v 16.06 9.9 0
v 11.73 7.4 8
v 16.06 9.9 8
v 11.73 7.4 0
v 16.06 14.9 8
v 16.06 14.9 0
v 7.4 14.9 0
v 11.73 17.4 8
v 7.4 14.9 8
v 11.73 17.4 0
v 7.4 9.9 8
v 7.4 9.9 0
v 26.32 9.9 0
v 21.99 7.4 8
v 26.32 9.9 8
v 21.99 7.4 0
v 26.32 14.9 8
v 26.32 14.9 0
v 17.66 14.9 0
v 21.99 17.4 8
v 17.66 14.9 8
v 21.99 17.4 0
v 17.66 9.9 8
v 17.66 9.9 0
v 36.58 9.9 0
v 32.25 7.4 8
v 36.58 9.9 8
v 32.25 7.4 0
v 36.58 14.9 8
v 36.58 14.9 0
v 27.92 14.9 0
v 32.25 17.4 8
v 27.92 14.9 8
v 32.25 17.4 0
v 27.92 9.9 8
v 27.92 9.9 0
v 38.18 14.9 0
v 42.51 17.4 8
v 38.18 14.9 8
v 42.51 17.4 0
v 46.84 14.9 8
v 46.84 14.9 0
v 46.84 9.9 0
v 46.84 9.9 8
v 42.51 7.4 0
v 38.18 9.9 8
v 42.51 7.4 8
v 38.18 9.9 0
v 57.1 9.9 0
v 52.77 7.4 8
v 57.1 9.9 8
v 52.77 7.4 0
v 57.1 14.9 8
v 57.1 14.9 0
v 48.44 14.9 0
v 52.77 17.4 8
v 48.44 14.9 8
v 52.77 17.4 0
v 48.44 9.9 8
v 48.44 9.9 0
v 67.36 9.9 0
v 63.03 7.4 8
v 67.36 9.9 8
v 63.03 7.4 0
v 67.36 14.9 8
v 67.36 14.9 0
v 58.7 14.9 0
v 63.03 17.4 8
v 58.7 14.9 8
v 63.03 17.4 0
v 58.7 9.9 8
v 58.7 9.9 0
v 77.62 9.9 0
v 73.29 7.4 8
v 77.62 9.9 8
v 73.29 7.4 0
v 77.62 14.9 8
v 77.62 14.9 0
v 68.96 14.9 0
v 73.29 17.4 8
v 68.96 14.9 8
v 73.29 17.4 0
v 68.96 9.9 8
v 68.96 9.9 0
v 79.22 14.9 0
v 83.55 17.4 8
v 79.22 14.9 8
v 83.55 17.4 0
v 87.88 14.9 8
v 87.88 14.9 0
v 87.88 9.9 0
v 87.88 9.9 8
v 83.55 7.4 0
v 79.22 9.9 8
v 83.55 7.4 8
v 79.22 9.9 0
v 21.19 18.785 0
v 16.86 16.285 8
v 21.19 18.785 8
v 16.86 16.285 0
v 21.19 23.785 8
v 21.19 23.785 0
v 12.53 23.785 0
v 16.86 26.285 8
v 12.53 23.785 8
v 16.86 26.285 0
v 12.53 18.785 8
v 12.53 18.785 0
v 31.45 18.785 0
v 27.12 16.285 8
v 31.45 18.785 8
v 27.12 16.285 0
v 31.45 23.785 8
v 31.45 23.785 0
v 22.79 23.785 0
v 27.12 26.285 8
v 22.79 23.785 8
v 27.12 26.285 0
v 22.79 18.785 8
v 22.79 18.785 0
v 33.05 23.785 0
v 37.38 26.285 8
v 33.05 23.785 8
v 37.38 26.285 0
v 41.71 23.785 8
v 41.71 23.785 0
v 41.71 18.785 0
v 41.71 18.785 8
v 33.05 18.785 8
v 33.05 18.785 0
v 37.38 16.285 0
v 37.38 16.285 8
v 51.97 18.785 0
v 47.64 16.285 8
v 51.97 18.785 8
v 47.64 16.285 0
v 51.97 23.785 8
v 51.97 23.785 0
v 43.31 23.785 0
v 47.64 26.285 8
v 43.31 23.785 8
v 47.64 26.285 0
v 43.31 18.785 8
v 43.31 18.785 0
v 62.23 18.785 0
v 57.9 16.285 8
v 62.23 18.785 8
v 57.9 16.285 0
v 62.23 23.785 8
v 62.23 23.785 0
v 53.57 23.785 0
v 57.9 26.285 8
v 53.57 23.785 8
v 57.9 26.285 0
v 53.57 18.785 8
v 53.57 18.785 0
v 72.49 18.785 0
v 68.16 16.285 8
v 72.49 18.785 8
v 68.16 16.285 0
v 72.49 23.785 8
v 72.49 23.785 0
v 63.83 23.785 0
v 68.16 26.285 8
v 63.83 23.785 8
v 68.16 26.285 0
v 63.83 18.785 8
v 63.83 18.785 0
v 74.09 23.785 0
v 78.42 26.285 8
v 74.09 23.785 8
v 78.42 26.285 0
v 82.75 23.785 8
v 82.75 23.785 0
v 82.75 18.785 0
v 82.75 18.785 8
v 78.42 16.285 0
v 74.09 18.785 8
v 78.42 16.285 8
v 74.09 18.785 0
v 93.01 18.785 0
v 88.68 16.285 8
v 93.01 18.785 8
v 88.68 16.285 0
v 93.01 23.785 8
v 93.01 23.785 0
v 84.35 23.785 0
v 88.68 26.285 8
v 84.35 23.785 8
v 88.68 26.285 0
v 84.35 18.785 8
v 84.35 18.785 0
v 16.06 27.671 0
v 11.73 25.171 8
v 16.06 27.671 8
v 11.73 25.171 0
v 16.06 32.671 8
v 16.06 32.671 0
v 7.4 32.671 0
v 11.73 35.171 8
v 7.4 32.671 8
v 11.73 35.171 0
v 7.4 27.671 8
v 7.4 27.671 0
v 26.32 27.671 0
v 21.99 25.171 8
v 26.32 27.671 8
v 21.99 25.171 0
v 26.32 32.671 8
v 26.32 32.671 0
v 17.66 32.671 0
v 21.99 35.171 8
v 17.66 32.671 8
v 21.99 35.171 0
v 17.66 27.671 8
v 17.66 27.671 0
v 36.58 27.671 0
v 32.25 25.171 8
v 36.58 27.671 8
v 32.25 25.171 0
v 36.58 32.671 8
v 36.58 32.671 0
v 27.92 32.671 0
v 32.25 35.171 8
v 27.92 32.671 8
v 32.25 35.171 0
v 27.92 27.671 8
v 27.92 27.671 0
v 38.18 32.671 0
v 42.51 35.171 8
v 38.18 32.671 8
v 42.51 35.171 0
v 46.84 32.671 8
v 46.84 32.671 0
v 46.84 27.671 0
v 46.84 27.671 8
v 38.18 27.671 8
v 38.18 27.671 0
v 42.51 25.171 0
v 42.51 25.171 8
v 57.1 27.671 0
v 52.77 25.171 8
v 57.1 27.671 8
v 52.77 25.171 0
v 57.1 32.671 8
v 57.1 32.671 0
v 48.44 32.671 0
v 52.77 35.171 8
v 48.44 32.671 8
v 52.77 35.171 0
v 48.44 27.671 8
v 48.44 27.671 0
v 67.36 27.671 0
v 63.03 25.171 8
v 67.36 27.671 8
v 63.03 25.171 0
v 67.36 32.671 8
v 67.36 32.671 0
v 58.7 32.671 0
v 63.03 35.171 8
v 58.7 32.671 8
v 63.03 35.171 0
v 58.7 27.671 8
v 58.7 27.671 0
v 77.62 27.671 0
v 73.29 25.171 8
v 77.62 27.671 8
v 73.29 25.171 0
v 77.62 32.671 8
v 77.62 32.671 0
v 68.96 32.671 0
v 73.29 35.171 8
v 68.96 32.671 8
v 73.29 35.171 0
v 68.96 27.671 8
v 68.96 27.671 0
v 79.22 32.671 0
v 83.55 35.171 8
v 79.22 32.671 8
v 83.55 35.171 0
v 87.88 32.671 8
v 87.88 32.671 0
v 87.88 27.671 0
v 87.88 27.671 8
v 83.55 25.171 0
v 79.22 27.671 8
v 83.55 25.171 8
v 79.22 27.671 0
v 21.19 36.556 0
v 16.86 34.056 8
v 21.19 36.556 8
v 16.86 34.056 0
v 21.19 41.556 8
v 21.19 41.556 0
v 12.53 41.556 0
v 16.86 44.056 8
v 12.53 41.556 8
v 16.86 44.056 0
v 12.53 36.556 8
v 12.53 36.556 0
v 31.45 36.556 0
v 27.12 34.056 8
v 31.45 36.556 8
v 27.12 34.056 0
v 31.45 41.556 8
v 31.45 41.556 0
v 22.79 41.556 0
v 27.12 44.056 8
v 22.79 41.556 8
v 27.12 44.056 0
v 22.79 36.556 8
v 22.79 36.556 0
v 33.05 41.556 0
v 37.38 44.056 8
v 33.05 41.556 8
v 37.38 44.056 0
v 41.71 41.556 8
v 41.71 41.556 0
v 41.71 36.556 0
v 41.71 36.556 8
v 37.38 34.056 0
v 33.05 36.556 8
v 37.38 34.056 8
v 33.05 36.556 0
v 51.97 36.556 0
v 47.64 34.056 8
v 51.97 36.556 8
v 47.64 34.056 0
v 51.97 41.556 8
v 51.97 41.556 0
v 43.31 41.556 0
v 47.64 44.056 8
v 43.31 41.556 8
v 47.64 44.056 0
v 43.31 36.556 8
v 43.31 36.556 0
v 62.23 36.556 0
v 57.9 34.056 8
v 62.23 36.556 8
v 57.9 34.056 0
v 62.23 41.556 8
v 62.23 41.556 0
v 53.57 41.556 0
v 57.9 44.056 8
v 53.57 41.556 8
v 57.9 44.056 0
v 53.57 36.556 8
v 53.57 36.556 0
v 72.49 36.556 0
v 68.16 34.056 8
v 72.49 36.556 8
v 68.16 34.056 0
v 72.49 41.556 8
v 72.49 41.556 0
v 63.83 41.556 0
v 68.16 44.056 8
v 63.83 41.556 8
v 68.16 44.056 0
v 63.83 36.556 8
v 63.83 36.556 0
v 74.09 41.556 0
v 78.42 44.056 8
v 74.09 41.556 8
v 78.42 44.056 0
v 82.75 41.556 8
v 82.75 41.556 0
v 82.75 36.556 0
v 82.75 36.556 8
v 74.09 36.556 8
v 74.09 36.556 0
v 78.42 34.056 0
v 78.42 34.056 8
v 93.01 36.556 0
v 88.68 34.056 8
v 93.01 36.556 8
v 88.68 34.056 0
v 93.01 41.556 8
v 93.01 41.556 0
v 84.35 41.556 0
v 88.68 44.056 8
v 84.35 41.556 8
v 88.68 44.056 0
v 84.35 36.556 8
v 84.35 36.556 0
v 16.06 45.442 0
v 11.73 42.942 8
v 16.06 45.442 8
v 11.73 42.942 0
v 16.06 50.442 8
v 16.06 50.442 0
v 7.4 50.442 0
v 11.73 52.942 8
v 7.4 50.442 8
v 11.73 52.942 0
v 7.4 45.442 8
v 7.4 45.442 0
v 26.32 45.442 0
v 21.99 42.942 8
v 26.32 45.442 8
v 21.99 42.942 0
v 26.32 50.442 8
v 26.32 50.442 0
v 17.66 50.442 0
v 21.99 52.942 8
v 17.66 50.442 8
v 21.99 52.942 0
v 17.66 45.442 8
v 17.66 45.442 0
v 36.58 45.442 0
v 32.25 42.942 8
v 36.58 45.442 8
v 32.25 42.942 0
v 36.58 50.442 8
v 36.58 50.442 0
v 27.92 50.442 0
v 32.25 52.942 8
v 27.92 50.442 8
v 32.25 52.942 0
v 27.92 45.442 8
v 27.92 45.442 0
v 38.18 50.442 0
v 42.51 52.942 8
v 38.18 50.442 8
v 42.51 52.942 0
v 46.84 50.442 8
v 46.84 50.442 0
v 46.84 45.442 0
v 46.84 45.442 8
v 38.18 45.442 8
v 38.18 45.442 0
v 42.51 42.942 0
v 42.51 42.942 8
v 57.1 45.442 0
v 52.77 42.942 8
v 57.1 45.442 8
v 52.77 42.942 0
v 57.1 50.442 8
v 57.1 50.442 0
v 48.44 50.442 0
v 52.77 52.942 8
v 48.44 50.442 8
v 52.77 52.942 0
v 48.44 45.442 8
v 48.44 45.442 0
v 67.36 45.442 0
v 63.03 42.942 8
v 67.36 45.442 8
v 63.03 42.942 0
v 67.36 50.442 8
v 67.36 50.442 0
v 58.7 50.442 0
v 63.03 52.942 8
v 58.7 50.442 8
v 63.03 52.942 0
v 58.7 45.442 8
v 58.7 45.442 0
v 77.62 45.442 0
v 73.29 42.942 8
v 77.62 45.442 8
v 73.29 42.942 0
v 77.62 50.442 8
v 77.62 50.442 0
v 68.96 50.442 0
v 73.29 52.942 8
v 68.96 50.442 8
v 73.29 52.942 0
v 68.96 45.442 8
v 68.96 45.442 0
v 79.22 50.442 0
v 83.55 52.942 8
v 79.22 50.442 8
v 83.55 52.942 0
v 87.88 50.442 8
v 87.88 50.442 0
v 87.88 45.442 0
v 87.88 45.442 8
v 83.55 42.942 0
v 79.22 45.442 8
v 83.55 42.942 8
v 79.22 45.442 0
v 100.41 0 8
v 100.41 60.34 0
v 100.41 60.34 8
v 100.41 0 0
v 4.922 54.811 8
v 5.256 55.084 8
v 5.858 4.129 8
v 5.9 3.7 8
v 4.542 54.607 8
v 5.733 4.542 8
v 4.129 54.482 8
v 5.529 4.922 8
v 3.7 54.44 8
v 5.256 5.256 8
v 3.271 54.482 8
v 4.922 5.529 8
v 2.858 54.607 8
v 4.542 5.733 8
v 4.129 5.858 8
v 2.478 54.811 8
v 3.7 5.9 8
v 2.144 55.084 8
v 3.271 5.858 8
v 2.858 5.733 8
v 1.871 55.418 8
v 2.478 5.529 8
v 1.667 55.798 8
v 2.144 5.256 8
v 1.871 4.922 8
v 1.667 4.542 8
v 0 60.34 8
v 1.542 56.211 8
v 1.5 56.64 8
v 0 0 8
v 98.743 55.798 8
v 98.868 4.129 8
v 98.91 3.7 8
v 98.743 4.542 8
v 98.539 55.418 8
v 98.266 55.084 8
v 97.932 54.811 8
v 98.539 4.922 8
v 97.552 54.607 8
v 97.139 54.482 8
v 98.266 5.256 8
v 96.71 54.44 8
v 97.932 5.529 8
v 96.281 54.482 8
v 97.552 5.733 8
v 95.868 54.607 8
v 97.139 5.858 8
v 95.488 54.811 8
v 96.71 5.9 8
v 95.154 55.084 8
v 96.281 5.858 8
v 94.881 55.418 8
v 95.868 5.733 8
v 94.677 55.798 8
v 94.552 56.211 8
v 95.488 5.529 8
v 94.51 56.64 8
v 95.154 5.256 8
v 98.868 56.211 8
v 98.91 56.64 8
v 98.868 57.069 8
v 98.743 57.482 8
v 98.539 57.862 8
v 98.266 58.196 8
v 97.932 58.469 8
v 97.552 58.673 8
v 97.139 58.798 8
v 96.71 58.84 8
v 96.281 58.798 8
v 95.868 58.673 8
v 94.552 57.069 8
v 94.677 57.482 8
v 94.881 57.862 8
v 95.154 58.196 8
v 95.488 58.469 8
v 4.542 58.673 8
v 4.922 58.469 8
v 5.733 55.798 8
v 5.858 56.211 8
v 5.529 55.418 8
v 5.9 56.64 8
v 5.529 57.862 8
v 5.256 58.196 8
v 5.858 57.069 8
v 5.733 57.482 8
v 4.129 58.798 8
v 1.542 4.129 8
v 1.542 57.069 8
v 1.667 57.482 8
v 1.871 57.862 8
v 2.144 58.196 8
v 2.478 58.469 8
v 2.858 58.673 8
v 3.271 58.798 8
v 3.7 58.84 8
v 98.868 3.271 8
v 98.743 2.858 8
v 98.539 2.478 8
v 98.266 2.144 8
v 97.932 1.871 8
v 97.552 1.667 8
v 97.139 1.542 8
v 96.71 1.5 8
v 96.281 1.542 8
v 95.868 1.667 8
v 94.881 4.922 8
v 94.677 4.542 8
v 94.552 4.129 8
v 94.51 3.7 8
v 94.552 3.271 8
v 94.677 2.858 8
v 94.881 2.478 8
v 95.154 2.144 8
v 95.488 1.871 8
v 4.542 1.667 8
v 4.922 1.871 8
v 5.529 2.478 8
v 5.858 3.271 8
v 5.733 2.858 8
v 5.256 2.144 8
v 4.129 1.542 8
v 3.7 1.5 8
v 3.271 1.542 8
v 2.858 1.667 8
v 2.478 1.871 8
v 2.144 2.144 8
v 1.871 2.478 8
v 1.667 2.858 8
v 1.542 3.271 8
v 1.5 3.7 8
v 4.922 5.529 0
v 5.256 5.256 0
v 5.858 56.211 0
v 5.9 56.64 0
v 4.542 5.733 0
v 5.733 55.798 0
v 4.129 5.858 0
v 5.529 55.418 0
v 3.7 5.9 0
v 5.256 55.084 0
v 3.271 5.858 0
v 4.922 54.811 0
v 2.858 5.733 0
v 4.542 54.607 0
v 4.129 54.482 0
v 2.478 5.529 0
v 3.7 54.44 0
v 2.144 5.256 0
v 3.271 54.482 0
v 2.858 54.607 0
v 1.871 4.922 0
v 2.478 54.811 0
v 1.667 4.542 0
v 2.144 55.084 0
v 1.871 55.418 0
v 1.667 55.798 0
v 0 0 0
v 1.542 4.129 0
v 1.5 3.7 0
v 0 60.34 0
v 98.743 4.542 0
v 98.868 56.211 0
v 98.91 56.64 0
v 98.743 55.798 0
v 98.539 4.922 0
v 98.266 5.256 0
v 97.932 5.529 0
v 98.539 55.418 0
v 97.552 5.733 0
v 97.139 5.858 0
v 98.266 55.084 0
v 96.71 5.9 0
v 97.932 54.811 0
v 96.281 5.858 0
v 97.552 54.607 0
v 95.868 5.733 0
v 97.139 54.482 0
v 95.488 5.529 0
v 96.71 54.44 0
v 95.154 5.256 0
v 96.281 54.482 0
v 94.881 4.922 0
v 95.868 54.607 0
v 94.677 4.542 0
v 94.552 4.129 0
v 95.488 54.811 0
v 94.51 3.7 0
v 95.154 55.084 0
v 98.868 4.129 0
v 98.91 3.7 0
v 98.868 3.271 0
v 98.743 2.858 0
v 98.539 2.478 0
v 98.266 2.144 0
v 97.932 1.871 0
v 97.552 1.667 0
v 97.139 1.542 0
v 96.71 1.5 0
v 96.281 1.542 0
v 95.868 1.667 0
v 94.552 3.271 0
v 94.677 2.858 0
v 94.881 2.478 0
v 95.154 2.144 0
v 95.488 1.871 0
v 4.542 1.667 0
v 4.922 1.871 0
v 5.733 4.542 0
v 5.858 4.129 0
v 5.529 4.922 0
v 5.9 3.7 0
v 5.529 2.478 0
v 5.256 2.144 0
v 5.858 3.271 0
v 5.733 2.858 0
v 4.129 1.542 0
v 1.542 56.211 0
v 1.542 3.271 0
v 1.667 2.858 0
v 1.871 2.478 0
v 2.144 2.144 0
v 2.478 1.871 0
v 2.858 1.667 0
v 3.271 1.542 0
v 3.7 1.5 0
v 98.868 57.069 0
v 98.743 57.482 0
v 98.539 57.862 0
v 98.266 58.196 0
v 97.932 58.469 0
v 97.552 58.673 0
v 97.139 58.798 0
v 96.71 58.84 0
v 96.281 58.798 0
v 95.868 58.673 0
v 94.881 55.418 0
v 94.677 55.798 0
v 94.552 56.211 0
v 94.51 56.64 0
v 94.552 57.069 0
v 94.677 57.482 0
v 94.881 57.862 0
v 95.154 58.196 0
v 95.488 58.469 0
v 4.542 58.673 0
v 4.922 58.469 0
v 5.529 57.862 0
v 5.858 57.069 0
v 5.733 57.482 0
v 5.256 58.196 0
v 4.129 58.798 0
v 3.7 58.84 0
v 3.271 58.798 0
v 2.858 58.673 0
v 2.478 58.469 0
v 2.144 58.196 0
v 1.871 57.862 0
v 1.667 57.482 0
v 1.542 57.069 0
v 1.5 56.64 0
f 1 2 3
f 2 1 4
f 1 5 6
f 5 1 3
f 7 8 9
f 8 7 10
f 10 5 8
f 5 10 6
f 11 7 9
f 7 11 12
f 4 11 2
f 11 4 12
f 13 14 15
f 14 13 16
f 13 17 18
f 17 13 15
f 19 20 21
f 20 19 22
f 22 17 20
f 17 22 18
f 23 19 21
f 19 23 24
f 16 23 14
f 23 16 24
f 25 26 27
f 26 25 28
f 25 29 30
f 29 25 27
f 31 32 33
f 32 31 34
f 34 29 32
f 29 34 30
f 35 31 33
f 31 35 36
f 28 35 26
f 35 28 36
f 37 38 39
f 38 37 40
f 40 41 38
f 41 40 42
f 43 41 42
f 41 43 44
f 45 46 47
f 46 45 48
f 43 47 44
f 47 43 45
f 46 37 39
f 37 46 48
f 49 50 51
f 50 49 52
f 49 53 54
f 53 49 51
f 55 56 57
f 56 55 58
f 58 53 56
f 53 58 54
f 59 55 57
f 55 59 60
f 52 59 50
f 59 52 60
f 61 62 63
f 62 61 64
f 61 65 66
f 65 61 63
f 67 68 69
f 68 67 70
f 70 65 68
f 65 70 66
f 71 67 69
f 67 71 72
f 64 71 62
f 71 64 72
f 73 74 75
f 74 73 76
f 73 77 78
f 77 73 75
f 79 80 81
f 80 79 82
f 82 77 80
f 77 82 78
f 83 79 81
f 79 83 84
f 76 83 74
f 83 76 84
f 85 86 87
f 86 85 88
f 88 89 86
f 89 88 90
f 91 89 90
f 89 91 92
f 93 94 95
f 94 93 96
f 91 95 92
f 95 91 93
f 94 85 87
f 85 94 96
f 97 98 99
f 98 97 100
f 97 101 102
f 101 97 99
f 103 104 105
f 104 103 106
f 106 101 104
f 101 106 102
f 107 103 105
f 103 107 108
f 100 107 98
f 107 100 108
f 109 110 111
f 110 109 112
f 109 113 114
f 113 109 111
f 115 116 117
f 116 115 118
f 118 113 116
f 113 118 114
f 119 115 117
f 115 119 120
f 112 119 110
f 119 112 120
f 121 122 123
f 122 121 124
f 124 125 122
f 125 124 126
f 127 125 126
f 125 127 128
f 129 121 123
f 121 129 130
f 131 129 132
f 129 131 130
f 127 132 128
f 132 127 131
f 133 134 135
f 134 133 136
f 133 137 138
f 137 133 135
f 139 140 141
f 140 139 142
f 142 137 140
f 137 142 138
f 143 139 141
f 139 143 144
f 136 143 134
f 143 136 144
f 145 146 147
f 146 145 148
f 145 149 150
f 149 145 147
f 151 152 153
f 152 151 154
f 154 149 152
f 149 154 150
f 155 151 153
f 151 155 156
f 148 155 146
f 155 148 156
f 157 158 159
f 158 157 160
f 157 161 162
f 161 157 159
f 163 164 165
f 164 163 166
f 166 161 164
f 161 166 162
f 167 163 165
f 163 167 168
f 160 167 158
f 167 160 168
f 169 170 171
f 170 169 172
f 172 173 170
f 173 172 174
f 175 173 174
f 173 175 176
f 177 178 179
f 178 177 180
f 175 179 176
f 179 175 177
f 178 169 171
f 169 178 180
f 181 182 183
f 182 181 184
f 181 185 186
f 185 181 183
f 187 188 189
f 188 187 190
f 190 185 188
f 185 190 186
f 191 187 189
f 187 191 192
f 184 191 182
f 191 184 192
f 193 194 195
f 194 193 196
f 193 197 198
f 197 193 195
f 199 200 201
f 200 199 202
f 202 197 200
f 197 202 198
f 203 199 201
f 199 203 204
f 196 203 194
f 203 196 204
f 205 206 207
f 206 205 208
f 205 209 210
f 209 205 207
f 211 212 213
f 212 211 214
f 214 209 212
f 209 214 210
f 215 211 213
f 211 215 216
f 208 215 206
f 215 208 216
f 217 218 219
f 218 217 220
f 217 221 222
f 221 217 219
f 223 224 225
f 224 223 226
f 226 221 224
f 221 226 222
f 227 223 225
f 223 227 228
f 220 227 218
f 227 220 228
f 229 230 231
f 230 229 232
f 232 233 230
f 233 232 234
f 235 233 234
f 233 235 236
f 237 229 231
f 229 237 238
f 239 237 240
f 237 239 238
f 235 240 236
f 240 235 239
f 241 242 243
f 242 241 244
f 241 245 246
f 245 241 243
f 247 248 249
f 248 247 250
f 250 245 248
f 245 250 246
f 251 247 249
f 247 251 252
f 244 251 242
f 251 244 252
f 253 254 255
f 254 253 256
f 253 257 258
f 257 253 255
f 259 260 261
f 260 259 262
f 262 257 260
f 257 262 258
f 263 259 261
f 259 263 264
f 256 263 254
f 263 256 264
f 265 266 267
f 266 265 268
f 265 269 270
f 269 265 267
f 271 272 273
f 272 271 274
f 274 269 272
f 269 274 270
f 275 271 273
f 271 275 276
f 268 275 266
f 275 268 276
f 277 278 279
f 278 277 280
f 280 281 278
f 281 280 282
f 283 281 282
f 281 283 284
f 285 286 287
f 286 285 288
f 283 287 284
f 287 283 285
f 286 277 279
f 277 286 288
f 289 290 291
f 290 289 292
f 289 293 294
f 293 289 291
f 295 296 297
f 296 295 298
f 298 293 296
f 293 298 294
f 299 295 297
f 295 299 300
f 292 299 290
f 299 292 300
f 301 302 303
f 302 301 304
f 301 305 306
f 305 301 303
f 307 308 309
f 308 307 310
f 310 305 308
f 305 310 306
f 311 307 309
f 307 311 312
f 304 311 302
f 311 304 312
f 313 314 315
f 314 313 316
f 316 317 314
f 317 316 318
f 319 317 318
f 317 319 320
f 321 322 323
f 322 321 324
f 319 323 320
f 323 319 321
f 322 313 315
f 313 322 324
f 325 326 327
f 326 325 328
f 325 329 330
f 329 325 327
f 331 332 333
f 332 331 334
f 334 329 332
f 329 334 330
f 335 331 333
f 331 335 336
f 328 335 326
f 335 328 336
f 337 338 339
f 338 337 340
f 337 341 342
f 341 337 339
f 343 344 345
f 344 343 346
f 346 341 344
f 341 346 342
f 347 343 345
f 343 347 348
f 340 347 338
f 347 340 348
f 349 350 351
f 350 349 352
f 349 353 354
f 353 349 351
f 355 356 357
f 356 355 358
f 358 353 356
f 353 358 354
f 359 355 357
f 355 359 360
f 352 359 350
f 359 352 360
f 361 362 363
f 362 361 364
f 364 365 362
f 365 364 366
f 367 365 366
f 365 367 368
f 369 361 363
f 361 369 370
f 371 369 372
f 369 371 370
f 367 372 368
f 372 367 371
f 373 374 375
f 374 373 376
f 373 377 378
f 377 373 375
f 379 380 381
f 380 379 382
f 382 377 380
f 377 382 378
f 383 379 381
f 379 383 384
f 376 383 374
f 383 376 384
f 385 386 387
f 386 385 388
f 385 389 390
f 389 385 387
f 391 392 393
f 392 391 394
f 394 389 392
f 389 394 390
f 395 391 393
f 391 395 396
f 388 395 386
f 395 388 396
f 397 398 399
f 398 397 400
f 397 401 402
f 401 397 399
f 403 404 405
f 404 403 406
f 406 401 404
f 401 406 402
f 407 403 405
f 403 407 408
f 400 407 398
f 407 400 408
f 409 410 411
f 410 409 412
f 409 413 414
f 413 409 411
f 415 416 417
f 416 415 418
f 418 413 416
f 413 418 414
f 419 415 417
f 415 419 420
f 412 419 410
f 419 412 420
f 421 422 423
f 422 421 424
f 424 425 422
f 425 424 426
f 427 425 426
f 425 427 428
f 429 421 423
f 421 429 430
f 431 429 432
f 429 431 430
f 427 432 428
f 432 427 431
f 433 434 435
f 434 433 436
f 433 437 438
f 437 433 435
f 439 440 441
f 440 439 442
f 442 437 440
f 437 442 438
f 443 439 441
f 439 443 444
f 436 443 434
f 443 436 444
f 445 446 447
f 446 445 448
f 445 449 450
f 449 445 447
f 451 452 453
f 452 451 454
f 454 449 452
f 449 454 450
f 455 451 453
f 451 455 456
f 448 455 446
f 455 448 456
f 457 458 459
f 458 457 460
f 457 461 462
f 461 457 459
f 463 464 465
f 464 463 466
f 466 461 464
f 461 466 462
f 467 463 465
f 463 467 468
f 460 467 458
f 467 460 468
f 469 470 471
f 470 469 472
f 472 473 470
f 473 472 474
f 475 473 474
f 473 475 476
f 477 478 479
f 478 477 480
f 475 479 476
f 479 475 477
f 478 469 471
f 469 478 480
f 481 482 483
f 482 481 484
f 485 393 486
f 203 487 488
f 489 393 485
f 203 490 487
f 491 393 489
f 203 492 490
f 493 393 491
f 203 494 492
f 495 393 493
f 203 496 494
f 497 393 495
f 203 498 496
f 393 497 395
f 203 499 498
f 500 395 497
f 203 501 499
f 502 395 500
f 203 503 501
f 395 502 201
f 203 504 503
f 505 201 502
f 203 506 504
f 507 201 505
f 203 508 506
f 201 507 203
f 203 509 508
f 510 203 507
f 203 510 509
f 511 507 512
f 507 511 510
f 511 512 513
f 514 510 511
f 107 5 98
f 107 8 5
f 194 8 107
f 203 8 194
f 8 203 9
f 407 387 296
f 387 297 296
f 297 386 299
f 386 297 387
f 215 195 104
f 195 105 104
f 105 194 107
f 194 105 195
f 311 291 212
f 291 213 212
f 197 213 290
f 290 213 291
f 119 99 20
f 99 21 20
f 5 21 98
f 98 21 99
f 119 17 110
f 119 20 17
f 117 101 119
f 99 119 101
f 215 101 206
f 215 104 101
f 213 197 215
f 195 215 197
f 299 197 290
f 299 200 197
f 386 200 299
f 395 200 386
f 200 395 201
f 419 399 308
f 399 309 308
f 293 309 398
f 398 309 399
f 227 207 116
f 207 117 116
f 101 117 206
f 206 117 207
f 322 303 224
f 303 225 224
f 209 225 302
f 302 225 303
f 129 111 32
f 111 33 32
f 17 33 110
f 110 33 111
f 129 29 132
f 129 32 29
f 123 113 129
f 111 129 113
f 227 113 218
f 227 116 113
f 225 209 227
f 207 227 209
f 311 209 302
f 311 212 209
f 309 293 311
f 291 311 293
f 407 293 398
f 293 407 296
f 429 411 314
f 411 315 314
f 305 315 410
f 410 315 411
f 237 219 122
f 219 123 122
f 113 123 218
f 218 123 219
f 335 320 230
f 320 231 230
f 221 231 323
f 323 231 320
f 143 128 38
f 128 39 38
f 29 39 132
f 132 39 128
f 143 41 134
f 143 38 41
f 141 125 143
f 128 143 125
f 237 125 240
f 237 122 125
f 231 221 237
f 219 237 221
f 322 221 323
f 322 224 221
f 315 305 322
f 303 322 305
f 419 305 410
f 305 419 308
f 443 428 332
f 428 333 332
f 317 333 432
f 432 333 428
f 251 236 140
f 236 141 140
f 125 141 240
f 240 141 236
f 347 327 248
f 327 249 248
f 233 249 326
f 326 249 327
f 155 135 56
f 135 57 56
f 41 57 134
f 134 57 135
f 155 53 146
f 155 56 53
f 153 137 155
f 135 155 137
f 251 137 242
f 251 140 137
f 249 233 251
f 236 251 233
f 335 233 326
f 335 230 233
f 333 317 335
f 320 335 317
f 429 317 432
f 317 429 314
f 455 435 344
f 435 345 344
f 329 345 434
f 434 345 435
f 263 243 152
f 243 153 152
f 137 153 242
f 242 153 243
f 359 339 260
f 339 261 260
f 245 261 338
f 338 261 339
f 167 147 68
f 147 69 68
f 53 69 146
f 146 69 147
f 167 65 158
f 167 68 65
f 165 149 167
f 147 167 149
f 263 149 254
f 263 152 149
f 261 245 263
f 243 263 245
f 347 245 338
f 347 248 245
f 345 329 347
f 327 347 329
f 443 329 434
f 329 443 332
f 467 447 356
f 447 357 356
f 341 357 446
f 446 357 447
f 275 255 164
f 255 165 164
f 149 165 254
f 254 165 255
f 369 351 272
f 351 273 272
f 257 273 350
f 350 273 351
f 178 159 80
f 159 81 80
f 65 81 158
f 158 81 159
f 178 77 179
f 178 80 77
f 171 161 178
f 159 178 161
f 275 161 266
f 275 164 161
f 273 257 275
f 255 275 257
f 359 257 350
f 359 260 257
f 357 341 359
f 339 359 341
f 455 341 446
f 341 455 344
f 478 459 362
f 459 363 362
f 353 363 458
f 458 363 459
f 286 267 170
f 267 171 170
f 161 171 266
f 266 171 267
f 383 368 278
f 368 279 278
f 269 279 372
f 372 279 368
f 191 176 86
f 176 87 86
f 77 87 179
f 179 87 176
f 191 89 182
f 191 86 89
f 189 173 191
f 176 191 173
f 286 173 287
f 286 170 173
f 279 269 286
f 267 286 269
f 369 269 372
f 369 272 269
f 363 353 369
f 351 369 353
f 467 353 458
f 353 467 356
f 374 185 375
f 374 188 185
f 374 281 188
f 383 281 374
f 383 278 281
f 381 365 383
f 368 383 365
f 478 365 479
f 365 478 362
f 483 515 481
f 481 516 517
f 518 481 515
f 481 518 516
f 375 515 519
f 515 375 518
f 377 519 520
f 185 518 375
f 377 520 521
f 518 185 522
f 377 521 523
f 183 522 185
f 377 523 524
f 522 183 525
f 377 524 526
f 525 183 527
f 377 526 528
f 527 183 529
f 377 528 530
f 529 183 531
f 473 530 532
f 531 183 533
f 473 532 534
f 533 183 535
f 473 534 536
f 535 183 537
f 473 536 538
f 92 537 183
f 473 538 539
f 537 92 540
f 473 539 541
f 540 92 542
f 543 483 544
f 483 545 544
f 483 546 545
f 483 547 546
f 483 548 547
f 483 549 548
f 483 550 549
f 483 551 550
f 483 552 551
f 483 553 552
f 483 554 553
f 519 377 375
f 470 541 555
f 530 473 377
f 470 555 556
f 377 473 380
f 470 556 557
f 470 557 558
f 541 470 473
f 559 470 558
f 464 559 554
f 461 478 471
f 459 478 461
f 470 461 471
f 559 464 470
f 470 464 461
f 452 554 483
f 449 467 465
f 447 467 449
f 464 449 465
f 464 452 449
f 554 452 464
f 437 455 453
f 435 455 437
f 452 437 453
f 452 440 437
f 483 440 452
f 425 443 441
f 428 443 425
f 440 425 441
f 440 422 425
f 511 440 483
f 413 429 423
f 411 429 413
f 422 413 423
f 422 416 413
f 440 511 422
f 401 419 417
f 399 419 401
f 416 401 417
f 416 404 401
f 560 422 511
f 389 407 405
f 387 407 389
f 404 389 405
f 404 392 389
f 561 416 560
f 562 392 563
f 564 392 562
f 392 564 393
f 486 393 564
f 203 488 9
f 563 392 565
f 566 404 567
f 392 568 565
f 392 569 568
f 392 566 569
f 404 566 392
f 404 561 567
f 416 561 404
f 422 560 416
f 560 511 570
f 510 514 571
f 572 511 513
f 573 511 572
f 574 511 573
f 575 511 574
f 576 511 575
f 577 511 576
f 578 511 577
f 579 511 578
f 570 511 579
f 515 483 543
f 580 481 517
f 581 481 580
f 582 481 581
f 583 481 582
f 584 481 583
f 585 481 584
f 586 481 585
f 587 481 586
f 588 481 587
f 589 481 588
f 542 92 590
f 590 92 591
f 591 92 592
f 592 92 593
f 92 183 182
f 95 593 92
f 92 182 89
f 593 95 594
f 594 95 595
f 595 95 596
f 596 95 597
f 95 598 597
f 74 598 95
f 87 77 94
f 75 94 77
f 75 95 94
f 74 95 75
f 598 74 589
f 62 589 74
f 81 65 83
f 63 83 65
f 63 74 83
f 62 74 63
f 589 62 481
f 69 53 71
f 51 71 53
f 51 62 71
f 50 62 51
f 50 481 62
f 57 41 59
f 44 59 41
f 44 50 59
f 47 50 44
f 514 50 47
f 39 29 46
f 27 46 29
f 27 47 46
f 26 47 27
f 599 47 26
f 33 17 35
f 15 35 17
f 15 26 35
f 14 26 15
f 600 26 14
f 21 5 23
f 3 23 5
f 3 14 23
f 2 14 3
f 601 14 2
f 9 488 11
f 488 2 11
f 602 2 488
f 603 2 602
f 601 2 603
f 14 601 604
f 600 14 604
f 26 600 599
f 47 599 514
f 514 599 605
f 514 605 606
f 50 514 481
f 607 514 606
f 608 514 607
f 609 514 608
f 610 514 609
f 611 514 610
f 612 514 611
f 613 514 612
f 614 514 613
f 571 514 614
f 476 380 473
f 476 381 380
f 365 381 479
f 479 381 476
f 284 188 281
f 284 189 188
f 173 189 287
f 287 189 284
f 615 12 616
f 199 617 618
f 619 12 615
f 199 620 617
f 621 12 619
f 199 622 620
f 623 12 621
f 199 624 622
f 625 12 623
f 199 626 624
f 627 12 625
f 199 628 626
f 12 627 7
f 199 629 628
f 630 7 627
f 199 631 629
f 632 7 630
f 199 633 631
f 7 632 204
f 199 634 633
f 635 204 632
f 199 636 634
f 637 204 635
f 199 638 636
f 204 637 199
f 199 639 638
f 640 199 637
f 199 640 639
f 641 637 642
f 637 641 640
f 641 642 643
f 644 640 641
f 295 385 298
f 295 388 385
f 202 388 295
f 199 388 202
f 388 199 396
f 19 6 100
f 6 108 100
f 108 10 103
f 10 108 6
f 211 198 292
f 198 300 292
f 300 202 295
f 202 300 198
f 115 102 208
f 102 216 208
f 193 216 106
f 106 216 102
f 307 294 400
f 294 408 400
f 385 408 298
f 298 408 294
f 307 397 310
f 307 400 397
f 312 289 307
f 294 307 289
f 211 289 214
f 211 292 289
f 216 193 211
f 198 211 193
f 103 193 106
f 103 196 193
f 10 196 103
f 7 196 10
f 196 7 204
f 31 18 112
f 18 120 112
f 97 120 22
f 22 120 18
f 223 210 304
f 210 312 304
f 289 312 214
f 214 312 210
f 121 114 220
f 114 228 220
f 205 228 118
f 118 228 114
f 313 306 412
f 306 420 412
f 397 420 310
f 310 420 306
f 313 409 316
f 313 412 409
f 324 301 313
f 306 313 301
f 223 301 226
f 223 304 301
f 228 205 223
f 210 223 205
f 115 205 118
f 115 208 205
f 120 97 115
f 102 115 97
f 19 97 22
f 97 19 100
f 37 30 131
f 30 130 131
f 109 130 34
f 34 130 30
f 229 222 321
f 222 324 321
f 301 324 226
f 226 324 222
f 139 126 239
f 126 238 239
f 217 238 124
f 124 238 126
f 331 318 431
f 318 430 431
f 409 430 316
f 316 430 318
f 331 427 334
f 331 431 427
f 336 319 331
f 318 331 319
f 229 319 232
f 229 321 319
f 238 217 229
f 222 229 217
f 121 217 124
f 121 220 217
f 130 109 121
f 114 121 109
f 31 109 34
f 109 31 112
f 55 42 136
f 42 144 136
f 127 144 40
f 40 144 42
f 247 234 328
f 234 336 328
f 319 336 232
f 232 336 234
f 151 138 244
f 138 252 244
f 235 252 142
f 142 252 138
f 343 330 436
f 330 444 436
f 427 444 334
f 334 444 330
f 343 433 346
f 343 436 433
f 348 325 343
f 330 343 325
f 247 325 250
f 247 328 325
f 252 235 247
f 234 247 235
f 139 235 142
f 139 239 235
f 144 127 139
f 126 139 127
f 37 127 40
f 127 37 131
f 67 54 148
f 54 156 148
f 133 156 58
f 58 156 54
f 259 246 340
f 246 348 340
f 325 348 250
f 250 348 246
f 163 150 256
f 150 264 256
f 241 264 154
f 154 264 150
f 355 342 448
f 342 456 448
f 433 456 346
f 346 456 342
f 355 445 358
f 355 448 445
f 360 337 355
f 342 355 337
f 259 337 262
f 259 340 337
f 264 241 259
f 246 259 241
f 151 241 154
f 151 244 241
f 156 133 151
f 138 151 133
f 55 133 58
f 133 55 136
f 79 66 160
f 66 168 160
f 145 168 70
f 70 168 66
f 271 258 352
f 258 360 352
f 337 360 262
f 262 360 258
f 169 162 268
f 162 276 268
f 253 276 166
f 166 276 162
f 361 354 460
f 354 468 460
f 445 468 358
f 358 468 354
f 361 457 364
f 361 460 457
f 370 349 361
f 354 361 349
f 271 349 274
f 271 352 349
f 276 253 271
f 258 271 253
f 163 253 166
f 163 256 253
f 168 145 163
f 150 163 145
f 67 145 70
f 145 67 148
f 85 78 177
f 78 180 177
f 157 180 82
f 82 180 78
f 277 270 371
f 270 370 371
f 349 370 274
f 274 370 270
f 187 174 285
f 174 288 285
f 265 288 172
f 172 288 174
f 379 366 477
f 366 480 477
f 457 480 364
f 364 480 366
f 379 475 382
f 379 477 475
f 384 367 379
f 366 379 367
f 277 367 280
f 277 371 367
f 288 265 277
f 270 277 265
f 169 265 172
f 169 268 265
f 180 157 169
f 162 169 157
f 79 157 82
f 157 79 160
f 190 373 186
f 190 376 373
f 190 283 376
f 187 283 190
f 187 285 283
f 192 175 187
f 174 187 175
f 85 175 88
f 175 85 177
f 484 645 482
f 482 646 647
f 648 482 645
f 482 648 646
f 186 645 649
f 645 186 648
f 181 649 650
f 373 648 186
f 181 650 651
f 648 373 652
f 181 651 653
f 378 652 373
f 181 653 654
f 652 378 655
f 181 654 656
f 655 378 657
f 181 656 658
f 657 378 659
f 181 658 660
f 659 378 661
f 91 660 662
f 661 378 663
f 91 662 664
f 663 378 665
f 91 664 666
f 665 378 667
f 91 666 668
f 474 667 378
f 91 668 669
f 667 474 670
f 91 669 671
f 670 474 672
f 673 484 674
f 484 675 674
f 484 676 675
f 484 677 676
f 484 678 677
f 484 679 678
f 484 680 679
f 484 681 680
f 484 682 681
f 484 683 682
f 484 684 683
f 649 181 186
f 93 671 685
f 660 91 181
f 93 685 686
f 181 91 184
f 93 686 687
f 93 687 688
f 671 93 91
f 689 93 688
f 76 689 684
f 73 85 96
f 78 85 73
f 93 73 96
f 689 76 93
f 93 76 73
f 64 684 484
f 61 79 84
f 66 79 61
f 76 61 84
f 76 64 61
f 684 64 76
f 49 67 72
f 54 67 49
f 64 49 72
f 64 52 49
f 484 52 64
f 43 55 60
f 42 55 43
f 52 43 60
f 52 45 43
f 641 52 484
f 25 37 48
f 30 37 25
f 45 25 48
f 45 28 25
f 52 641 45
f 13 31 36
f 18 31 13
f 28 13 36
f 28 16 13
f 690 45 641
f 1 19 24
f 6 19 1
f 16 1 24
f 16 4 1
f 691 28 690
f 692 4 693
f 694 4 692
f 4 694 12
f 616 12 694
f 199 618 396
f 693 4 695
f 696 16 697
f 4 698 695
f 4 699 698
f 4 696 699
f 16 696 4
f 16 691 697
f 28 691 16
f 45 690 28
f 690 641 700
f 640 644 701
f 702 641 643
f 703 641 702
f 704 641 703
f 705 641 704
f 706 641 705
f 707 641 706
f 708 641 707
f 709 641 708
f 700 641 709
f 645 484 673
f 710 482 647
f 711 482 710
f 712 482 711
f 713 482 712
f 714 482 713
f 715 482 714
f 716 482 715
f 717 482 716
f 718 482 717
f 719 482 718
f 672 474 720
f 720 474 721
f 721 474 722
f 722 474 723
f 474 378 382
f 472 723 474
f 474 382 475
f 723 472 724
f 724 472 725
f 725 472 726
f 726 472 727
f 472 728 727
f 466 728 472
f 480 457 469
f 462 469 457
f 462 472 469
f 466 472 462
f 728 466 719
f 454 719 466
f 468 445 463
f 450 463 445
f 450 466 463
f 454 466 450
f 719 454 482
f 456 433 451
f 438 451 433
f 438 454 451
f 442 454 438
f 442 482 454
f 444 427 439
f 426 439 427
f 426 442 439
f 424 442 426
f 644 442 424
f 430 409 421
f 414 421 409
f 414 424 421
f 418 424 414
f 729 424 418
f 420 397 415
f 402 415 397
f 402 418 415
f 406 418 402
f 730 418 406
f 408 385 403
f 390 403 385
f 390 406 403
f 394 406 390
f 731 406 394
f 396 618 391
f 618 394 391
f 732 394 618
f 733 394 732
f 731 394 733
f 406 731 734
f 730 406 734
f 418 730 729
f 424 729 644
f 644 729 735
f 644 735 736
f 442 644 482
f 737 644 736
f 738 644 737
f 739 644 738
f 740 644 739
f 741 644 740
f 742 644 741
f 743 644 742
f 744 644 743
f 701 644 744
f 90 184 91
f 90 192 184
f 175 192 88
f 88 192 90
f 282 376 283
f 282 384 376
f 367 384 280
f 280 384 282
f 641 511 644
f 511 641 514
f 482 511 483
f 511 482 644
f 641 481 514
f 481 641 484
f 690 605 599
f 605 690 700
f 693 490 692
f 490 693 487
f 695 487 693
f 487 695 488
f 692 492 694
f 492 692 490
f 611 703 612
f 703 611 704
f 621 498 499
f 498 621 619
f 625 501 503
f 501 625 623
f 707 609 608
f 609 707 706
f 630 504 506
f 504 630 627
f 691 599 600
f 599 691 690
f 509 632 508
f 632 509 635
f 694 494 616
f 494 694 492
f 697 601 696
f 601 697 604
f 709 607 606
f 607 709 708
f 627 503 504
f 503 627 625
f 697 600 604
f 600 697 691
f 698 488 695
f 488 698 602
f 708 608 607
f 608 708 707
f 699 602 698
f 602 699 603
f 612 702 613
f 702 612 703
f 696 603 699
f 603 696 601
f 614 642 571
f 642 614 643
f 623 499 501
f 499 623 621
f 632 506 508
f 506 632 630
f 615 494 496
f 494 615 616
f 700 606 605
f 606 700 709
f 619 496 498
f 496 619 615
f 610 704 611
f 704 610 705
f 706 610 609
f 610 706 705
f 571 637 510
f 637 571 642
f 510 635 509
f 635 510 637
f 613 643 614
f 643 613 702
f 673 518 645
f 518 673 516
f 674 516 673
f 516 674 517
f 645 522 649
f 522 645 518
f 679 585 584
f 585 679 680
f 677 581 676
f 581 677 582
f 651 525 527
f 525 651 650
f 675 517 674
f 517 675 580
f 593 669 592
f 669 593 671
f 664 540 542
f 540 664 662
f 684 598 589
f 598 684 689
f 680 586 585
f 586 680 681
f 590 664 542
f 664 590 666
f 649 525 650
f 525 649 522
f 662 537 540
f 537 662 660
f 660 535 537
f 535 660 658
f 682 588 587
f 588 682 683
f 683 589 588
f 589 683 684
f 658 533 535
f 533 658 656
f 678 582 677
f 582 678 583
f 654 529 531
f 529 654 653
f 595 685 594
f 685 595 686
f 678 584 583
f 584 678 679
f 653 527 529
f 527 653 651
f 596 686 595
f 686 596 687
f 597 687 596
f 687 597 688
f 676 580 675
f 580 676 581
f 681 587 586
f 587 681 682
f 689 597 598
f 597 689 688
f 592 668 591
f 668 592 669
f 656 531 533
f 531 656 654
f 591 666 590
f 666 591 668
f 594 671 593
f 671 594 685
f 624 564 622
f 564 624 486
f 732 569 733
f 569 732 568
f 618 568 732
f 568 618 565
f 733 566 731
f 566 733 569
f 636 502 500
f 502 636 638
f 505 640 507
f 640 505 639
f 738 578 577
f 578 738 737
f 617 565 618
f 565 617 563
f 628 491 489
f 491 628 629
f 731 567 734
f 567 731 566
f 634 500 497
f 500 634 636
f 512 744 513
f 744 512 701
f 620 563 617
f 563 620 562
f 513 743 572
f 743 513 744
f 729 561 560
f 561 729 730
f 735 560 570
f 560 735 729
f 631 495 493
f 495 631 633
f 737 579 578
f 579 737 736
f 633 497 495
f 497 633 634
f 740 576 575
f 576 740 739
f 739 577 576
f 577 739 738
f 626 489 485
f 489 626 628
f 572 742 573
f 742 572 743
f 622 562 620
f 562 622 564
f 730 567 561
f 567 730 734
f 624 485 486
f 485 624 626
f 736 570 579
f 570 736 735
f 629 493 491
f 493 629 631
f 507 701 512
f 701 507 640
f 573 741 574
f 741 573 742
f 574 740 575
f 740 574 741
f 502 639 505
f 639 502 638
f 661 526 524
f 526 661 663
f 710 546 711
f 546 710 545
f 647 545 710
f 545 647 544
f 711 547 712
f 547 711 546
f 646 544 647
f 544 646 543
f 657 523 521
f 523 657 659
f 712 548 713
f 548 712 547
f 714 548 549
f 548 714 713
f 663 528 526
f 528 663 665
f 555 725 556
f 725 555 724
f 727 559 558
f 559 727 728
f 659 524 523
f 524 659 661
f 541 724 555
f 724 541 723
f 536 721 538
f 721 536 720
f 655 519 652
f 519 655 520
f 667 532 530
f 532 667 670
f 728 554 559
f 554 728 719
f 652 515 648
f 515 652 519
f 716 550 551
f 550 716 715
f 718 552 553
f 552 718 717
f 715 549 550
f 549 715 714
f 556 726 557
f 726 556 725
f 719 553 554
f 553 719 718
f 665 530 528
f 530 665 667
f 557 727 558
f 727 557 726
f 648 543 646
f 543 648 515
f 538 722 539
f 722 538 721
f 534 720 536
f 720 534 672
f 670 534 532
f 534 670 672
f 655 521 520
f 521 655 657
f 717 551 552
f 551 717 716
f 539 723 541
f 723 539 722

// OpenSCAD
$fn = 32;

// ----------------------------------------------------------------------
// Honeycomb panel: 100.41 x 60.34 mm, 40 cells of 10 mm
// ----------------------------------------------------------------------

// --- parameters (mm) ---
panel_w = 100.41;         // panel width
panel_d = 60.34;          // panel depth
thick = 8;                // panel thickness
cell_r = 5;               // hex cell circumradius
pitch = 10.26;            // hex cell pitch (centre to centre)
web = 1.6;                // web between the cells
columns = 8;              // columns of cells
rows = 5;                 // rows of cells
cell_count = 40;          // total cells
shift_x = 11.73;          // first cell offset in x
shift_y = 12.4;           // first cell offset in y
mount_d = 4.4;            // corner mounting holes
hole_off = 3.7;           // mounting hole offset from the corners

difference() {
  union() {
    cube([panel_w, panel_d, thick]);
  }
  /* hexagonal cells, point-up, cut right through the plate */
  for (row = [0 : rows - 1]) {
    for (col = [0 : columns - 1]) {
      translate([shift_x + col * pitch + (row % 2) * pitch / 2, shift_y + row * pitch * 0.866025, -2.5]) rotate([0, 0, 30]) cylinder(h = thick + 5, d = 2 * cell_r, $fn = 6);
    }
  }
  /* corner mounting holes, clear of the outer cell web */
  translate([3.7, 3.7, -2.5]) cylinder(h = thick + 5, d = mount_d);
  translate([96.71, 3.7, -2.5]) cylinder(h = thick + 5, d = mount_d);
  translate([3.7, 56.64, -2.5]) cylinder(h = thick + 5, d = mount_d);
  translate([96.71, 56.64, -2.5]) cylinder(h = thick + 5, d = mount_d);
}
